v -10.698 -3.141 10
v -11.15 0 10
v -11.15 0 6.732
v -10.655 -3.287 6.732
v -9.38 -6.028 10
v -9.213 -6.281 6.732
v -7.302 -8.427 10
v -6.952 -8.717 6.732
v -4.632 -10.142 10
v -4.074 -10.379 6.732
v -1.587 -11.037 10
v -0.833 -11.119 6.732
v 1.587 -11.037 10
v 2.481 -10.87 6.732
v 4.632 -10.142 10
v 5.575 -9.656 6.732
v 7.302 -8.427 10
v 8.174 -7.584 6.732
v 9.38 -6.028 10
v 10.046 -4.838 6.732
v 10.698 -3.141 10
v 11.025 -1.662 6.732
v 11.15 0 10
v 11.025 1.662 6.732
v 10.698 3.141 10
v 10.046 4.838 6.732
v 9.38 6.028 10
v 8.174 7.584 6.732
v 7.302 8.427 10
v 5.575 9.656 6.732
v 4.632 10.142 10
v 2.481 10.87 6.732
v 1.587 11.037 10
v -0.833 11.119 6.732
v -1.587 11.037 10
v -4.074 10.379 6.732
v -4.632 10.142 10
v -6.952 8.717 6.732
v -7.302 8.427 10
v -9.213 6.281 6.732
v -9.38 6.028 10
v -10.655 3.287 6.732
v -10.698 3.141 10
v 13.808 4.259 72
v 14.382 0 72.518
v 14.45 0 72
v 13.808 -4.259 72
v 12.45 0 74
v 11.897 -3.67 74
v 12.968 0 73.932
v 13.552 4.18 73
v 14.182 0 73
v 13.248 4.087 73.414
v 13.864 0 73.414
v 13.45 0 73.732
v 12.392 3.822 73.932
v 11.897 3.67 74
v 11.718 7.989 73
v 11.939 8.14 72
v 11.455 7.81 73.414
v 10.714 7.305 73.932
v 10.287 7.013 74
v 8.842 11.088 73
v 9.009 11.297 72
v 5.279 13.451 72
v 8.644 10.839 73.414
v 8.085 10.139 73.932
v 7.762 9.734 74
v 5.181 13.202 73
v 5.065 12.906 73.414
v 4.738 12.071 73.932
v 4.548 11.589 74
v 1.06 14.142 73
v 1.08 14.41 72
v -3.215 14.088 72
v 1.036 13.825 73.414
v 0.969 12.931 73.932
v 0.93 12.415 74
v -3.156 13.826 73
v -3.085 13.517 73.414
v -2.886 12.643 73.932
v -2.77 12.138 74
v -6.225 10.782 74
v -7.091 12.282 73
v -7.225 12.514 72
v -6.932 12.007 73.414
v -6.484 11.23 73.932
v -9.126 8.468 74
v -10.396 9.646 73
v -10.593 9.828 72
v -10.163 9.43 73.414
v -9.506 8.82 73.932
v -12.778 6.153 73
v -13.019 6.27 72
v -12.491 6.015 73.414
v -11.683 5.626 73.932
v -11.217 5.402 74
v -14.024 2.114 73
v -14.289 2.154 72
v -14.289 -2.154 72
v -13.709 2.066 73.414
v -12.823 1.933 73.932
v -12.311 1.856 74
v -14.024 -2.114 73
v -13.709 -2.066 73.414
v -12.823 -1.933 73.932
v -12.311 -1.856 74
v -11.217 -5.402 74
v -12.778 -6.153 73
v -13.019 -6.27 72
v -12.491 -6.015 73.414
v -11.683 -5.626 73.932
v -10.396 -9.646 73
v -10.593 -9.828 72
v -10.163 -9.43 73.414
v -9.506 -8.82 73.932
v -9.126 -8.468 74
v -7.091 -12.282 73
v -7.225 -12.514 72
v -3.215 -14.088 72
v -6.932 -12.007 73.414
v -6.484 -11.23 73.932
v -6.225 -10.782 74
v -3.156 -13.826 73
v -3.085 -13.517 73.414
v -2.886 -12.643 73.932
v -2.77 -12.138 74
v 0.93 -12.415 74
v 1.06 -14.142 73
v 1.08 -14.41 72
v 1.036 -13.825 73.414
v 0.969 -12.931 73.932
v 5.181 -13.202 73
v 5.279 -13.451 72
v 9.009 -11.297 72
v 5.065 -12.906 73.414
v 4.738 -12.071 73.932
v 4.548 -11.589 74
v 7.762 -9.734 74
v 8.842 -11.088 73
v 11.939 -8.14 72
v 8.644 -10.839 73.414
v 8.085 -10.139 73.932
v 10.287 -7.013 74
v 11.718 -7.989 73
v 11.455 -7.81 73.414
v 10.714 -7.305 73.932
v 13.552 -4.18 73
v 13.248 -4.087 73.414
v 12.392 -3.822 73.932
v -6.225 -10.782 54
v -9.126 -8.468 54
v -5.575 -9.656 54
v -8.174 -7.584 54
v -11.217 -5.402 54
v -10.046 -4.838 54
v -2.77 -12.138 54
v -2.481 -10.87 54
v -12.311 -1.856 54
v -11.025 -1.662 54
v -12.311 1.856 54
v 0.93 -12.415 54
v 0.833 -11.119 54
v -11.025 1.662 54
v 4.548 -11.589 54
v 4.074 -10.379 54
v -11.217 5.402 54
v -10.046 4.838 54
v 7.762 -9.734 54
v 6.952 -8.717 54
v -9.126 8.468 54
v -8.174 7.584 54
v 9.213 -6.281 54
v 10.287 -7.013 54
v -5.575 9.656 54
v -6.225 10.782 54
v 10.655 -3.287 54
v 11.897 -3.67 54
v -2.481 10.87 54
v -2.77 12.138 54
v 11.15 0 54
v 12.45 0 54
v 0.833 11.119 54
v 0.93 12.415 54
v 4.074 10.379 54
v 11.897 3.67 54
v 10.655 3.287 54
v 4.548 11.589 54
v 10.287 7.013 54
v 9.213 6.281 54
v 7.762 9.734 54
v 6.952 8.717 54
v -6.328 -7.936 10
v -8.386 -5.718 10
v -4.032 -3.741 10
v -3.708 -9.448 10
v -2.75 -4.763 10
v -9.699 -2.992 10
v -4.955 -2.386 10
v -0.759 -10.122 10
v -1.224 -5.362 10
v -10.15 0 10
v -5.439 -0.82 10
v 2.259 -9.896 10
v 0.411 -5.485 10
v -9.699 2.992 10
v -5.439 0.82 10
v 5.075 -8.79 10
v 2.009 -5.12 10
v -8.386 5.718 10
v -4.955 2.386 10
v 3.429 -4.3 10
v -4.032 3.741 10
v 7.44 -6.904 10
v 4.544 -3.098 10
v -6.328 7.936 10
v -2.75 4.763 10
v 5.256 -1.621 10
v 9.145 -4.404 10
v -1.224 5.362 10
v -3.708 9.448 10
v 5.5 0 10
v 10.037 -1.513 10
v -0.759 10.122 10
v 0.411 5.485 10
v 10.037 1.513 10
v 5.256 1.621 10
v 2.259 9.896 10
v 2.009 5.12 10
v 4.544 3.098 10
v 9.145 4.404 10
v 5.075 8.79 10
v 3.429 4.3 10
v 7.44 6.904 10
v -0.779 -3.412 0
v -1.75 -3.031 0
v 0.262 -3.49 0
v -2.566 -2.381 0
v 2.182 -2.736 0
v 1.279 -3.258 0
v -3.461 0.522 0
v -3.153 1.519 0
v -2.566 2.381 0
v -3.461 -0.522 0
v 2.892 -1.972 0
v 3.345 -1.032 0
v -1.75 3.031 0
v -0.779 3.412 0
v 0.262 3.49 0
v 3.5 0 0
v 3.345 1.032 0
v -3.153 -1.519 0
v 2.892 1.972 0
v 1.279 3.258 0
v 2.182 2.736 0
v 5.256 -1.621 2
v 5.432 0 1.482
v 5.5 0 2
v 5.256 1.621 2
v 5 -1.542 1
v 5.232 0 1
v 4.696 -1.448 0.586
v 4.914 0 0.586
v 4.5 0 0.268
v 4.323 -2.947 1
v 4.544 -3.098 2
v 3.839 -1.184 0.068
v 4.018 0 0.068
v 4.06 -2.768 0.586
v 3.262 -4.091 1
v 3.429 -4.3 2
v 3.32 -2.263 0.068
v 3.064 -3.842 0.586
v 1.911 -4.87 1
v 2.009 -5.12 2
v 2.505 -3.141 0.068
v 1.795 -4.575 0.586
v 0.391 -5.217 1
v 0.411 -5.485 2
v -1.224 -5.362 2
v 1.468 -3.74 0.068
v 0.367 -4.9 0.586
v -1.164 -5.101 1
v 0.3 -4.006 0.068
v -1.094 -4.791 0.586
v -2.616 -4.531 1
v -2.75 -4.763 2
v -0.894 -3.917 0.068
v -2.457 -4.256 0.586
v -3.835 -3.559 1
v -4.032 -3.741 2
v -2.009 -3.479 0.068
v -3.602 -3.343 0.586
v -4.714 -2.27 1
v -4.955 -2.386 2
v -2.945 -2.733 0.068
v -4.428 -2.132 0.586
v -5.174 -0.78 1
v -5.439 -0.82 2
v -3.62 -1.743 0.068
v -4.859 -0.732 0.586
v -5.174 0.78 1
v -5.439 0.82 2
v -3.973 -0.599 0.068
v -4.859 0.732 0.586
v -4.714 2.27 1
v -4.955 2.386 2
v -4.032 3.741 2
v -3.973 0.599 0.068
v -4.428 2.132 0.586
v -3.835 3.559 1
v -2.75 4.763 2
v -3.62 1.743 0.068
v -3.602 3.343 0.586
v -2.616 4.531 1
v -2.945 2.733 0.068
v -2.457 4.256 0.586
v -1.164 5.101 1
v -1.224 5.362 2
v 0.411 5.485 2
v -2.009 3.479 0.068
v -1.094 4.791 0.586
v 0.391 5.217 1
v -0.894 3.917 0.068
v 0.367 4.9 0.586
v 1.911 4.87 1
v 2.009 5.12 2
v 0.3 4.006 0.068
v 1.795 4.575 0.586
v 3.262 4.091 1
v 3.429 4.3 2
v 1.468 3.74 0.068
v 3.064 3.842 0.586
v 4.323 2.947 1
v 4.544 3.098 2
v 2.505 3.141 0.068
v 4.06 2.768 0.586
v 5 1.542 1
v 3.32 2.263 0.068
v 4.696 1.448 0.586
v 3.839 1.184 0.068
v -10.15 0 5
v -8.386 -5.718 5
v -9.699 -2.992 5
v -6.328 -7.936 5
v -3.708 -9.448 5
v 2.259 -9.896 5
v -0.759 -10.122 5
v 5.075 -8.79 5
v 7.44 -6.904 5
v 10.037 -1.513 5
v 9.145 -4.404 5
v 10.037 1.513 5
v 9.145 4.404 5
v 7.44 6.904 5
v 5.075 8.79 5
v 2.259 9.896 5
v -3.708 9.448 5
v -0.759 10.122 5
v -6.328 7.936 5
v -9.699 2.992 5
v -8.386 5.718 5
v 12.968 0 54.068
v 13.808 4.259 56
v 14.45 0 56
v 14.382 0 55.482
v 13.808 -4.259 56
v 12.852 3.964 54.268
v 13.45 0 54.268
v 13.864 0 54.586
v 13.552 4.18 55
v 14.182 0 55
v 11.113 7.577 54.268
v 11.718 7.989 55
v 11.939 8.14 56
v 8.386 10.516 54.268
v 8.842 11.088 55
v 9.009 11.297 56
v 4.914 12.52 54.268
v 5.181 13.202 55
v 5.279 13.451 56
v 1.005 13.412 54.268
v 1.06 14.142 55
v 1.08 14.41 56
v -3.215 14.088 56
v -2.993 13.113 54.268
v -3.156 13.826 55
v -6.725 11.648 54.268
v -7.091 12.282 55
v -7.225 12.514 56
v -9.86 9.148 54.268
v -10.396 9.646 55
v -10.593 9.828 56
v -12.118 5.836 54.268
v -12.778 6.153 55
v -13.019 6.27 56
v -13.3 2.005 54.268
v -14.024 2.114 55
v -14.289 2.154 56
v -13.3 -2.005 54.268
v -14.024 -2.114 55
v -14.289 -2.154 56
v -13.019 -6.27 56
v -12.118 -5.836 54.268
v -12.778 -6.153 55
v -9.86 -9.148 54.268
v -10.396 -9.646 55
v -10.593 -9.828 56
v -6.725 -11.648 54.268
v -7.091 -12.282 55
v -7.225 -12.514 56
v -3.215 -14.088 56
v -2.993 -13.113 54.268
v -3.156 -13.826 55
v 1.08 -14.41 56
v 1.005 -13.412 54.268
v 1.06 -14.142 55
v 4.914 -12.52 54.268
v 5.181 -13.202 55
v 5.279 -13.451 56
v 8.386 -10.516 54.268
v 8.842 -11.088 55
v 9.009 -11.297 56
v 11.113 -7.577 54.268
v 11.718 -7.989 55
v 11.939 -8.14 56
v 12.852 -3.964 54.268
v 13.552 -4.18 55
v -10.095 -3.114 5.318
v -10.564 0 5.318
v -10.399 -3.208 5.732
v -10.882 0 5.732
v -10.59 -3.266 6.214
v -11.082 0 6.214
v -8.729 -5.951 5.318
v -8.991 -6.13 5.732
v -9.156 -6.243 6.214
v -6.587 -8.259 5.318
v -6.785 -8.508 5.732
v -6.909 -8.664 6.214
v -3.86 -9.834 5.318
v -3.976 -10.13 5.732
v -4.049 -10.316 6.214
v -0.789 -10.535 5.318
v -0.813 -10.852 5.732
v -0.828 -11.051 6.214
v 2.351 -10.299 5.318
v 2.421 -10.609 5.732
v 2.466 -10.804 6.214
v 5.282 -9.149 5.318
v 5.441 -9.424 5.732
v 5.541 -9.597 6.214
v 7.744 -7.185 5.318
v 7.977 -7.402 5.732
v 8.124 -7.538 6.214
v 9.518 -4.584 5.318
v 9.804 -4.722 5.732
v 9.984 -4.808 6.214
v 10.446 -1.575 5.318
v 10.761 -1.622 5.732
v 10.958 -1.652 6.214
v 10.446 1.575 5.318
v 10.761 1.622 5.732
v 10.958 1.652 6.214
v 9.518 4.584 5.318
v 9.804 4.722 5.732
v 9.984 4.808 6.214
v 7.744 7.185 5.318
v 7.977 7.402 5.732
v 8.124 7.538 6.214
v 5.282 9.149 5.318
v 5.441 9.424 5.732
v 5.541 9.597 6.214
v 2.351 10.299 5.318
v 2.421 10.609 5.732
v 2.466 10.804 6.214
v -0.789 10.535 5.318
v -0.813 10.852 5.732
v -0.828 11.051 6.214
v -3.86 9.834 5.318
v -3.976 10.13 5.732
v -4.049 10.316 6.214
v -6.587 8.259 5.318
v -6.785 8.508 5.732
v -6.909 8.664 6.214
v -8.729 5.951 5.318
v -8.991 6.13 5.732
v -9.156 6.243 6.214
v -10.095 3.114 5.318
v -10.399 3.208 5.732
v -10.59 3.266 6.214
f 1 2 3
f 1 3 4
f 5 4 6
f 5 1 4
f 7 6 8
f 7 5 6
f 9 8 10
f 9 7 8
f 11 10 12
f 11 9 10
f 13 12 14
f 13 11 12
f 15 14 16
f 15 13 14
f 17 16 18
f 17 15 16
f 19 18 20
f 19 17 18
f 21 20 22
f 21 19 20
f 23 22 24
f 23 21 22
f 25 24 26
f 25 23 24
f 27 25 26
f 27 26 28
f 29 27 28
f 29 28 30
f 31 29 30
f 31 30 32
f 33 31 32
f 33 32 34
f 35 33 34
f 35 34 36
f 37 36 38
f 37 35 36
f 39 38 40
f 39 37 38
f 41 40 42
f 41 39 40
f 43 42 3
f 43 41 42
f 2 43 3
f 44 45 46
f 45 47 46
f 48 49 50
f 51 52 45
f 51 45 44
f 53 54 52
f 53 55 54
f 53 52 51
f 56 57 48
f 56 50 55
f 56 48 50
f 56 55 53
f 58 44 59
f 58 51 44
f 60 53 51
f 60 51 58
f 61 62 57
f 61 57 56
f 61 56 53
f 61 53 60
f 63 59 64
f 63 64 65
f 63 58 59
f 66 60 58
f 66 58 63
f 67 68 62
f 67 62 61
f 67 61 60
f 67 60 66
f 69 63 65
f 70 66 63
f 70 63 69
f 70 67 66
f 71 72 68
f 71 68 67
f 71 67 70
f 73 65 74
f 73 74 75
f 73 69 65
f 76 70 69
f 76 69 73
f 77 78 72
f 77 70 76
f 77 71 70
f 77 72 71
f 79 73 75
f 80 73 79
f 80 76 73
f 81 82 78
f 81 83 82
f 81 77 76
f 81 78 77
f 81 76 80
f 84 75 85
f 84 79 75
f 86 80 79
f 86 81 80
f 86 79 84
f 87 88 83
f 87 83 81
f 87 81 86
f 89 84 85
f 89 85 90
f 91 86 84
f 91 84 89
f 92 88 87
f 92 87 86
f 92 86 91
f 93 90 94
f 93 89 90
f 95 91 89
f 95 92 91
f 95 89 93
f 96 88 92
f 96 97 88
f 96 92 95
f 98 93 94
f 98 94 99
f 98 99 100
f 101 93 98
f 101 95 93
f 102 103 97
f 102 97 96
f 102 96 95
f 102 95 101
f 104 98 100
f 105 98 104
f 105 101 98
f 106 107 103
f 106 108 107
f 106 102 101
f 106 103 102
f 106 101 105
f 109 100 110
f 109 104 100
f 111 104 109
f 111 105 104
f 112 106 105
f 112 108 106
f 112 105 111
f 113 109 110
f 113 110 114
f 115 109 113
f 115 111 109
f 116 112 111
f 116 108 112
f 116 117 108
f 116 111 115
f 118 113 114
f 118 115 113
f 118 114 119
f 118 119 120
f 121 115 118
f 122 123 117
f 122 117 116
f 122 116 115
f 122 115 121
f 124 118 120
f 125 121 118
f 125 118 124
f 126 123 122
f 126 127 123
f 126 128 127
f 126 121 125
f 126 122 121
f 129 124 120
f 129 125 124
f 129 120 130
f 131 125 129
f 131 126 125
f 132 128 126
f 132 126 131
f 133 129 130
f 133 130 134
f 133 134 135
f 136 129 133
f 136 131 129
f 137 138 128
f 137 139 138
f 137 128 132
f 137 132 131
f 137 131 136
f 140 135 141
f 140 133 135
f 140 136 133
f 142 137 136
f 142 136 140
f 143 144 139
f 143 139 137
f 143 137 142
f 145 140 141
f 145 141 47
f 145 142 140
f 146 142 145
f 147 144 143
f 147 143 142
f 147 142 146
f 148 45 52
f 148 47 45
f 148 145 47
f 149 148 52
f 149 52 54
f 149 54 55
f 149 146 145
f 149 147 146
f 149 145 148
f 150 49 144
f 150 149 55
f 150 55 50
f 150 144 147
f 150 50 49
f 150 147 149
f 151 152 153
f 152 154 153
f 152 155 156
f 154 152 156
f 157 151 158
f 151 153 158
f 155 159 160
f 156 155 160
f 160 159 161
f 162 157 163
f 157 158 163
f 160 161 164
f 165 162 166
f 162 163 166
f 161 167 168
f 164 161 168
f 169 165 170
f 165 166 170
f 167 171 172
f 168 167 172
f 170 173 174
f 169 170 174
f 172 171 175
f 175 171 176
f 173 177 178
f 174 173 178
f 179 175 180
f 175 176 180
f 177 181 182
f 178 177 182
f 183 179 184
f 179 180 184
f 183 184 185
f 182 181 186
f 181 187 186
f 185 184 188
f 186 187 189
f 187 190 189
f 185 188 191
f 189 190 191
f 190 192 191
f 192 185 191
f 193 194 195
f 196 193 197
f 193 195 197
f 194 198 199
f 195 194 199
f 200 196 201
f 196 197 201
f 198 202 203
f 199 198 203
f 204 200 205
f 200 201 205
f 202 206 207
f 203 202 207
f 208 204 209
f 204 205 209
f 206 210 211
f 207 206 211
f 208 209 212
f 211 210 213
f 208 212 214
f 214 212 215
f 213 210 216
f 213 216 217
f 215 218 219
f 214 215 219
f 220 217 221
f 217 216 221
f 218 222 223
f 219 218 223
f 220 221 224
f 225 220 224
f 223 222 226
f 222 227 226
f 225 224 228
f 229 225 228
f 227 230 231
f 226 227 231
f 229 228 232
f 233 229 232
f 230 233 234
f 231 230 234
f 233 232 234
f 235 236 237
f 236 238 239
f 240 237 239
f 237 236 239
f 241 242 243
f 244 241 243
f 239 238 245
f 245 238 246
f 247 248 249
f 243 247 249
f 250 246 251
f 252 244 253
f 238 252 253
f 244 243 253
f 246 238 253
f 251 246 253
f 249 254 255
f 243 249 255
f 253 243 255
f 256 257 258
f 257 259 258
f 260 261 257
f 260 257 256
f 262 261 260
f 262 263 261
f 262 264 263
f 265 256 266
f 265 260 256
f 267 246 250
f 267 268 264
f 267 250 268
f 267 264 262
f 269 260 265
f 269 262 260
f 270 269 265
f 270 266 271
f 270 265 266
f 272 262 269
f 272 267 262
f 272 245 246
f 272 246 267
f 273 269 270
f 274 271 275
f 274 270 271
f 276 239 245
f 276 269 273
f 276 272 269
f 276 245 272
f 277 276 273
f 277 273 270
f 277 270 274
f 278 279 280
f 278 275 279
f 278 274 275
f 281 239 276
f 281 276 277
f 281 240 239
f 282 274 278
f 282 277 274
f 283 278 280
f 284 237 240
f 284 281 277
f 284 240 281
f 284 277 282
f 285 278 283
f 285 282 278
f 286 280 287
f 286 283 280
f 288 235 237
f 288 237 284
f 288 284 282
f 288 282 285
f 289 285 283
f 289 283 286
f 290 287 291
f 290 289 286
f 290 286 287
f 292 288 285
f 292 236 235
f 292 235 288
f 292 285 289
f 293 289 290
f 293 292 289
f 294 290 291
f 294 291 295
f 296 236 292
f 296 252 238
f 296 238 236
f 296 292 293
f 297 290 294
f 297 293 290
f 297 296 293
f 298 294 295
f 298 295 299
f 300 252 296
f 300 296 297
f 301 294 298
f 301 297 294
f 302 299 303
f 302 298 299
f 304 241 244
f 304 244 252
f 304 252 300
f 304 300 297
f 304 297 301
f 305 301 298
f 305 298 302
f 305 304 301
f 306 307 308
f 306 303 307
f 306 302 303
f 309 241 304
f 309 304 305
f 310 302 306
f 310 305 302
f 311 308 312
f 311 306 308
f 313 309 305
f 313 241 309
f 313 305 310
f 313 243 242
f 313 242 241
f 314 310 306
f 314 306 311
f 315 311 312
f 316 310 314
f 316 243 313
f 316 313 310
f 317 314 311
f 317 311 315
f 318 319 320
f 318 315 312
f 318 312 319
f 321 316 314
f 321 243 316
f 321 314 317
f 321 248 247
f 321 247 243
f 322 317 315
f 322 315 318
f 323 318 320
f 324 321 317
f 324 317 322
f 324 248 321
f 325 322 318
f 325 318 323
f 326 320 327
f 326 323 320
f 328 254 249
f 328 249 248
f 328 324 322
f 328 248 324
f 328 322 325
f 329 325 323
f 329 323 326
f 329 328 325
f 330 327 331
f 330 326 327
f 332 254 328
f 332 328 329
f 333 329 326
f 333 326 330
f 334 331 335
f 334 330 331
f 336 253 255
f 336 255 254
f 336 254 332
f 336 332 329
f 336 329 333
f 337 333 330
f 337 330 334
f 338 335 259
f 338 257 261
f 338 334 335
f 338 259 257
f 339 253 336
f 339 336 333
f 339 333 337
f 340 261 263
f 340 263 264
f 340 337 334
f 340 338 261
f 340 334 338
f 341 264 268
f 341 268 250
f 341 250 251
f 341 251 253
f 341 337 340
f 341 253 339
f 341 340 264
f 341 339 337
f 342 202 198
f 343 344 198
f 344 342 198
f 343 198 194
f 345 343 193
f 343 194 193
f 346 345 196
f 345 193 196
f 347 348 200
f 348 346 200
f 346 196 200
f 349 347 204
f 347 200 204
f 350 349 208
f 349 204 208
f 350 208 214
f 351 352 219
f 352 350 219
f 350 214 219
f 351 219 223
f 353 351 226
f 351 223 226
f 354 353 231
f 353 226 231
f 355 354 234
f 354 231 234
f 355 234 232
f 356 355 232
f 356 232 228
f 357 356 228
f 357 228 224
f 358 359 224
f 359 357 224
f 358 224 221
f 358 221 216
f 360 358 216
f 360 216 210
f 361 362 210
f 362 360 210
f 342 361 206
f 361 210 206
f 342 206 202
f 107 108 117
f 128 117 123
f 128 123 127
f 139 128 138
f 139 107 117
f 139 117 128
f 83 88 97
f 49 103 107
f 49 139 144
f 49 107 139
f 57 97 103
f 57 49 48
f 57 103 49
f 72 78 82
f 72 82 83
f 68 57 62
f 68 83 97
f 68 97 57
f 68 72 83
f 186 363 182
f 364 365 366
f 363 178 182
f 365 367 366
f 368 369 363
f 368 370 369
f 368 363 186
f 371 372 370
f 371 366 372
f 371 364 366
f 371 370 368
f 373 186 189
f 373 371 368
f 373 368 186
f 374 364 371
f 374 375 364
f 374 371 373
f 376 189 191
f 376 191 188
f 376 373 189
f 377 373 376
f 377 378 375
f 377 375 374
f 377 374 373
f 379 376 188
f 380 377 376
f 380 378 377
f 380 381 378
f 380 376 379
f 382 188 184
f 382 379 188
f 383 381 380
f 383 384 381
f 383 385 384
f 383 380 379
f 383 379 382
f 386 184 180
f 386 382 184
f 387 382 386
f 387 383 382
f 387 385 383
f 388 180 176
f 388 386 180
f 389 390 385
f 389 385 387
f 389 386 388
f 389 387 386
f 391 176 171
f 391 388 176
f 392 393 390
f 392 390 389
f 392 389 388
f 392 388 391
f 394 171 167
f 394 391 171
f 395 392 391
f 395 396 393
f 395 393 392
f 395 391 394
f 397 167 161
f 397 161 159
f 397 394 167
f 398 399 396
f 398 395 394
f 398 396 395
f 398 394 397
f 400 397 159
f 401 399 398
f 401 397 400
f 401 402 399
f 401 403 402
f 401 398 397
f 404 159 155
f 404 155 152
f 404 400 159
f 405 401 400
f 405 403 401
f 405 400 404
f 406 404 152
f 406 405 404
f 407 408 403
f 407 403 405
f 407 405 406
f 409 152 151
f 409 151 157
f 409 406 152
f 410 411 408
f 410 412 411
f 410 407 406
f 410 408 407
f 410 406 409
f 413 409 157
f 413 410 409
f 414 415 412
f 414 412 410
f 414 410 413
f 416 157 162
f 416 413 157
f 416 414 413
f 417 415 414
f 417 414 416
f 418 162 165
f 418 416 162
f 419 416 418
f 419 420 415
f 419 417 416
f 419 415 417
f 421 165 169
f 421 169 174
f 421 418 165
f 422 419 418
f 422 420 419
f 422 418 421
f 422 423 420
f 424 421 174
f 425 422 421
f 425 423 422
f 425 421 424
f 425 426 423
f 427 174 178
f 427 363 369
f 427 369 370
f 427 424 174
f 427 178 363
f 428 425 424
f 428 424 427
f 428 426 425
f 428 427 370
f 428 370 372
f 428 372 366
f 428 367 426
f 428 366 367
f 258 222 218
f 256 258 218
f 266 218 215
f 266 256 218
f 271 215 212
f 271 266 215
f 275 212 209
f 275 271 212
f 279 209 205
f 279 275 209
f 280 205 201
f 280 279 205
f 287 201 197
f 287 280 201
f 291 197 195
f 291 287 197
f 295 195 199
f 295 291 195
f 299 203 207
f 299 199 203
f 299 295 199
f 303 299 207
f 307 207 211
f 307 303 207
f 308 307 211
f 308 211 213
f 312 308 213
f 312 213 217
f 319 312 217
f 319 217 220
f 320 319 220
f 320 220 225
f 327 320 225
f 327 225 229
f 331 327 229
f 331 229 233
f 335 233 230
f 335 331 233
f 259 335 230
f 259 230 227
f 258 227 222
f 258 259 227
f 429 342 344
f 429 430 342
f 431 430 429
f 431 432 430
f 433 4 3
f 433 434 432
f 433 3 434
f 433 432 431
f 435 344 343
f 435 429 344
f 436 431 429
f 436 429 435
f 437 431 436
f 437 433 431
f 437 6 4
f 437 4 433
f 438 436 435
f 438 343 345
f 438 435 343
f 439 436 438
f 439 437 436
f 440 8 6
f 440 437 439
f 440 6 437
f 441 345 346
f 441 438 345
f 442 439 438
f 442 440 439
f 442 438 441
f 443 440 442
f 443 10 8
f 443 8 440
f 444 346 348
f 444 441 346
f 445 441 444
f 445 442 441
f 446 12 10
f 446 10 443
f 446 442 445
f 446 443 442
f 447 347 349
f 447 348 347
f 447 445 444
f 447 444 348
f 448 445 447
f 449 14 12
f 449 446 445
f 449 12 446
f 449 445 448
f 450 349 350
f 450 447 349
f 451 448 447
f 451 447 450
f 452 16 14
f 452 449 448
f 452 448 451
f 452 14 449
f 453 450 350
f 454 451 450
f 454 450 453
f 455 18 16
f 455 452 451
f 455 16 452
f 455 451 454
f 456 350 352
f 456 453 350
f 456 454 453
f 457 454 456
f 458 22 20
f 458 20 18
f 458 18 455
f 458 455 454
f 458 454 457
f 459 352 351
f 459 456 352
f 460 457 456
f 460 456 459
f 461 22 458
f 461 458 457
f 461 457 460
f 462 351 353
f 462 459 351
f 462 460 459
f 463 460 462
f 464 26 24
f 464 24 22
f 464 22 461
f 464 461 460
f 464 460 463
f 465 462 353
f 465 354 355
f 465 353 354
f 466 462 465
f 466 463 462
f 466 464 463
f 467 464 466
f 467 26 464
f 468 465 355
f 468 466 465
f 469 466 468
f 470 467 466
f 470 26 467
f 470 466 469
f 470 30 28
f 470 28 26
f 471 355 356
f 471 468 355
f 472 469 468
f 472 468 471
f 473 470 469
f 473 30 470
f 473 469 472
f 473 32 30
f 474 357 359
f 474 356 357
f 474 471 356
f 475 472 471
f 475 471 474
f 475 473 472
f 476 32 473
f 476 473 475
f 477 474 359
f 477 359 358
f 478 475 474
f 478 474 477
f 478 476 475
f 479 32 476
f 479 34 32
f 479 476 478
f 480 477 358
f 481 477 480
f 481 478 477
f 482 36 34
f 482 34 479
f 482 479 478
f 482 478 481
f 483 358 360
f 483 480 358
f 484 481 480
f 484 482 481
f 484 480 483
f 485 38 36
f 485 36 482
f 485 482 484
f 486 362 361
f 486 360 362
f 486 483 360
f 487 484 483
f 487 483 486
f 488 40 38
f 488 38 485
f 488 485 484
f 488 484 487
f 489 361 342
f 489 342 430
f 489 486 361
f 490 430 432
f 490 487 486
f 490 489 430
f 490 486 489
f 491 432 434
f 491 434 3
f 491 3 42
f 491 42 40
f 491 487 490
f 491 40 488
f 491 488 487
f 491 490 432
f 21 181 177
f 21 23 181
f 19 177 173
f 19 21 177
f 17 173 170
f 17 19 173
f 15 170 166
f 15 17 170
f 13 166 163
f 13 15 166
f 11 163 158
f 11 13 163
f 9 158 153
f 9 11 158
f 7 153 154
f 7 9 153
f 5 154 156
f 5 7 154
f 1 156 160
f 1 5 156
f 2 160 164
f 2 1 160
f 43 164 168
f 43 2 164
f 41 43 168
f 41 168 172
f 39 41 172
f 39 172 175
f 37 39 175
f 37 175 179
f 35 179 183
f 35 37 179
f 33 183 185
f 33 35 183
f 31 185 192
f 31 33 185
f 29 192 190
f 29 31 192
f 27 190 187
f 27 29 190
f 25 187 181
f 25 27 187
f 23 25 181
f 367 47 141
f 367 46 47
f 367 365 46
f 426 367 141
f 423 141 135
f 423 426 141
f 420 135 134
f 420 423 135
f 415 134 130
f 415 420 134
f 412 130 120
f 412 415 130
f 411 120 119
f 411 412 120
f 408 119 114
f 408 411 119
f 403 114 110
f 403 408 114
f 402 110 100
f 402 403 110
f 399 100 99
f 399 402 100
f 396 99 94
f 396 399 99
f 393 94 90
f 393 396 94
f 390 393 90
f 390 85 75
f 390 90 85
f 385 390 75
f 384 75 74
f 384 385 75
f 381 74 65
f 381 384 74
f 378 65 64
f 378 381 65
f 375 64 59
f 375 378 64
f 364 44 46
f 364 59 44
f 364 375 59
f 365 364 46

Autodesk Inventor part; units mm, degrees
ref_plane "YZ Plane" through (0, 0, 0) normal (1, 0, 0) x (0, 1, 0)
ref_plane "XZ Plane" through (0, 0, 0) normal (0, 1, 0) x (-1, 0, 0)
ref_plane "XY Plane" through (0, 0, 0) normal (0, 0, 1) x (1, 0, 0)
sketch "Sketch1" plane through (0, 0, 0) normal (0, 0, 1) x (1, 0, 0)
  circle A0 centre (0, 0) radius 5.5
  dimension "d0" = 11
extrude "Extrusion1" add sketch "Sketch1" along normal blind 10
sketch "Sketch2" plane through (0, 0, 10) normal (0, 0, 1) x (1, 0, 0)
  circle A0 centre (0, 0) radius 11.15
  dimension "d3" = 22.3
extrude "Extrusion3" add sketch "Sketch2" along normal blind 44
sketch "Sketch3" plane through (0, 0, 10) normal (0, 0, -1) x (-1, 0, 0)
  circle A0 centre (0, 0) radius 10.15
  circle A1 centre (0, 0) radius 11.15
  dimension "d8" = 20.3
  dimension "d9" = 22.3
extrude "Extrusion4" add sketch "Sketch3" along normal blind 5
sketch "Sketch4" plane through (0, 0, 54) normal (0, 0, 1) x (1, 0, 0)
  circle A0 centre (0, 0) radius 14.45
  dimension "d12" = 28.9
extrude "Extrusion5" add sketch "Sketch4" along normal blind 20
fillet "Fillet1" radius 2 1 edges at (-14.45, 0, 74)
fillet "Fillet2" radius 2 1 edges at (-5.5, 0, 0)
fillet "Fillet3" radius 2 1 edges at (11.15, 0, 5)
fillet "Fillet4" radius 2 1 edges at (-14.45, 0, 54)
properties part number "Elbow_Parallel_Rod_V1"
